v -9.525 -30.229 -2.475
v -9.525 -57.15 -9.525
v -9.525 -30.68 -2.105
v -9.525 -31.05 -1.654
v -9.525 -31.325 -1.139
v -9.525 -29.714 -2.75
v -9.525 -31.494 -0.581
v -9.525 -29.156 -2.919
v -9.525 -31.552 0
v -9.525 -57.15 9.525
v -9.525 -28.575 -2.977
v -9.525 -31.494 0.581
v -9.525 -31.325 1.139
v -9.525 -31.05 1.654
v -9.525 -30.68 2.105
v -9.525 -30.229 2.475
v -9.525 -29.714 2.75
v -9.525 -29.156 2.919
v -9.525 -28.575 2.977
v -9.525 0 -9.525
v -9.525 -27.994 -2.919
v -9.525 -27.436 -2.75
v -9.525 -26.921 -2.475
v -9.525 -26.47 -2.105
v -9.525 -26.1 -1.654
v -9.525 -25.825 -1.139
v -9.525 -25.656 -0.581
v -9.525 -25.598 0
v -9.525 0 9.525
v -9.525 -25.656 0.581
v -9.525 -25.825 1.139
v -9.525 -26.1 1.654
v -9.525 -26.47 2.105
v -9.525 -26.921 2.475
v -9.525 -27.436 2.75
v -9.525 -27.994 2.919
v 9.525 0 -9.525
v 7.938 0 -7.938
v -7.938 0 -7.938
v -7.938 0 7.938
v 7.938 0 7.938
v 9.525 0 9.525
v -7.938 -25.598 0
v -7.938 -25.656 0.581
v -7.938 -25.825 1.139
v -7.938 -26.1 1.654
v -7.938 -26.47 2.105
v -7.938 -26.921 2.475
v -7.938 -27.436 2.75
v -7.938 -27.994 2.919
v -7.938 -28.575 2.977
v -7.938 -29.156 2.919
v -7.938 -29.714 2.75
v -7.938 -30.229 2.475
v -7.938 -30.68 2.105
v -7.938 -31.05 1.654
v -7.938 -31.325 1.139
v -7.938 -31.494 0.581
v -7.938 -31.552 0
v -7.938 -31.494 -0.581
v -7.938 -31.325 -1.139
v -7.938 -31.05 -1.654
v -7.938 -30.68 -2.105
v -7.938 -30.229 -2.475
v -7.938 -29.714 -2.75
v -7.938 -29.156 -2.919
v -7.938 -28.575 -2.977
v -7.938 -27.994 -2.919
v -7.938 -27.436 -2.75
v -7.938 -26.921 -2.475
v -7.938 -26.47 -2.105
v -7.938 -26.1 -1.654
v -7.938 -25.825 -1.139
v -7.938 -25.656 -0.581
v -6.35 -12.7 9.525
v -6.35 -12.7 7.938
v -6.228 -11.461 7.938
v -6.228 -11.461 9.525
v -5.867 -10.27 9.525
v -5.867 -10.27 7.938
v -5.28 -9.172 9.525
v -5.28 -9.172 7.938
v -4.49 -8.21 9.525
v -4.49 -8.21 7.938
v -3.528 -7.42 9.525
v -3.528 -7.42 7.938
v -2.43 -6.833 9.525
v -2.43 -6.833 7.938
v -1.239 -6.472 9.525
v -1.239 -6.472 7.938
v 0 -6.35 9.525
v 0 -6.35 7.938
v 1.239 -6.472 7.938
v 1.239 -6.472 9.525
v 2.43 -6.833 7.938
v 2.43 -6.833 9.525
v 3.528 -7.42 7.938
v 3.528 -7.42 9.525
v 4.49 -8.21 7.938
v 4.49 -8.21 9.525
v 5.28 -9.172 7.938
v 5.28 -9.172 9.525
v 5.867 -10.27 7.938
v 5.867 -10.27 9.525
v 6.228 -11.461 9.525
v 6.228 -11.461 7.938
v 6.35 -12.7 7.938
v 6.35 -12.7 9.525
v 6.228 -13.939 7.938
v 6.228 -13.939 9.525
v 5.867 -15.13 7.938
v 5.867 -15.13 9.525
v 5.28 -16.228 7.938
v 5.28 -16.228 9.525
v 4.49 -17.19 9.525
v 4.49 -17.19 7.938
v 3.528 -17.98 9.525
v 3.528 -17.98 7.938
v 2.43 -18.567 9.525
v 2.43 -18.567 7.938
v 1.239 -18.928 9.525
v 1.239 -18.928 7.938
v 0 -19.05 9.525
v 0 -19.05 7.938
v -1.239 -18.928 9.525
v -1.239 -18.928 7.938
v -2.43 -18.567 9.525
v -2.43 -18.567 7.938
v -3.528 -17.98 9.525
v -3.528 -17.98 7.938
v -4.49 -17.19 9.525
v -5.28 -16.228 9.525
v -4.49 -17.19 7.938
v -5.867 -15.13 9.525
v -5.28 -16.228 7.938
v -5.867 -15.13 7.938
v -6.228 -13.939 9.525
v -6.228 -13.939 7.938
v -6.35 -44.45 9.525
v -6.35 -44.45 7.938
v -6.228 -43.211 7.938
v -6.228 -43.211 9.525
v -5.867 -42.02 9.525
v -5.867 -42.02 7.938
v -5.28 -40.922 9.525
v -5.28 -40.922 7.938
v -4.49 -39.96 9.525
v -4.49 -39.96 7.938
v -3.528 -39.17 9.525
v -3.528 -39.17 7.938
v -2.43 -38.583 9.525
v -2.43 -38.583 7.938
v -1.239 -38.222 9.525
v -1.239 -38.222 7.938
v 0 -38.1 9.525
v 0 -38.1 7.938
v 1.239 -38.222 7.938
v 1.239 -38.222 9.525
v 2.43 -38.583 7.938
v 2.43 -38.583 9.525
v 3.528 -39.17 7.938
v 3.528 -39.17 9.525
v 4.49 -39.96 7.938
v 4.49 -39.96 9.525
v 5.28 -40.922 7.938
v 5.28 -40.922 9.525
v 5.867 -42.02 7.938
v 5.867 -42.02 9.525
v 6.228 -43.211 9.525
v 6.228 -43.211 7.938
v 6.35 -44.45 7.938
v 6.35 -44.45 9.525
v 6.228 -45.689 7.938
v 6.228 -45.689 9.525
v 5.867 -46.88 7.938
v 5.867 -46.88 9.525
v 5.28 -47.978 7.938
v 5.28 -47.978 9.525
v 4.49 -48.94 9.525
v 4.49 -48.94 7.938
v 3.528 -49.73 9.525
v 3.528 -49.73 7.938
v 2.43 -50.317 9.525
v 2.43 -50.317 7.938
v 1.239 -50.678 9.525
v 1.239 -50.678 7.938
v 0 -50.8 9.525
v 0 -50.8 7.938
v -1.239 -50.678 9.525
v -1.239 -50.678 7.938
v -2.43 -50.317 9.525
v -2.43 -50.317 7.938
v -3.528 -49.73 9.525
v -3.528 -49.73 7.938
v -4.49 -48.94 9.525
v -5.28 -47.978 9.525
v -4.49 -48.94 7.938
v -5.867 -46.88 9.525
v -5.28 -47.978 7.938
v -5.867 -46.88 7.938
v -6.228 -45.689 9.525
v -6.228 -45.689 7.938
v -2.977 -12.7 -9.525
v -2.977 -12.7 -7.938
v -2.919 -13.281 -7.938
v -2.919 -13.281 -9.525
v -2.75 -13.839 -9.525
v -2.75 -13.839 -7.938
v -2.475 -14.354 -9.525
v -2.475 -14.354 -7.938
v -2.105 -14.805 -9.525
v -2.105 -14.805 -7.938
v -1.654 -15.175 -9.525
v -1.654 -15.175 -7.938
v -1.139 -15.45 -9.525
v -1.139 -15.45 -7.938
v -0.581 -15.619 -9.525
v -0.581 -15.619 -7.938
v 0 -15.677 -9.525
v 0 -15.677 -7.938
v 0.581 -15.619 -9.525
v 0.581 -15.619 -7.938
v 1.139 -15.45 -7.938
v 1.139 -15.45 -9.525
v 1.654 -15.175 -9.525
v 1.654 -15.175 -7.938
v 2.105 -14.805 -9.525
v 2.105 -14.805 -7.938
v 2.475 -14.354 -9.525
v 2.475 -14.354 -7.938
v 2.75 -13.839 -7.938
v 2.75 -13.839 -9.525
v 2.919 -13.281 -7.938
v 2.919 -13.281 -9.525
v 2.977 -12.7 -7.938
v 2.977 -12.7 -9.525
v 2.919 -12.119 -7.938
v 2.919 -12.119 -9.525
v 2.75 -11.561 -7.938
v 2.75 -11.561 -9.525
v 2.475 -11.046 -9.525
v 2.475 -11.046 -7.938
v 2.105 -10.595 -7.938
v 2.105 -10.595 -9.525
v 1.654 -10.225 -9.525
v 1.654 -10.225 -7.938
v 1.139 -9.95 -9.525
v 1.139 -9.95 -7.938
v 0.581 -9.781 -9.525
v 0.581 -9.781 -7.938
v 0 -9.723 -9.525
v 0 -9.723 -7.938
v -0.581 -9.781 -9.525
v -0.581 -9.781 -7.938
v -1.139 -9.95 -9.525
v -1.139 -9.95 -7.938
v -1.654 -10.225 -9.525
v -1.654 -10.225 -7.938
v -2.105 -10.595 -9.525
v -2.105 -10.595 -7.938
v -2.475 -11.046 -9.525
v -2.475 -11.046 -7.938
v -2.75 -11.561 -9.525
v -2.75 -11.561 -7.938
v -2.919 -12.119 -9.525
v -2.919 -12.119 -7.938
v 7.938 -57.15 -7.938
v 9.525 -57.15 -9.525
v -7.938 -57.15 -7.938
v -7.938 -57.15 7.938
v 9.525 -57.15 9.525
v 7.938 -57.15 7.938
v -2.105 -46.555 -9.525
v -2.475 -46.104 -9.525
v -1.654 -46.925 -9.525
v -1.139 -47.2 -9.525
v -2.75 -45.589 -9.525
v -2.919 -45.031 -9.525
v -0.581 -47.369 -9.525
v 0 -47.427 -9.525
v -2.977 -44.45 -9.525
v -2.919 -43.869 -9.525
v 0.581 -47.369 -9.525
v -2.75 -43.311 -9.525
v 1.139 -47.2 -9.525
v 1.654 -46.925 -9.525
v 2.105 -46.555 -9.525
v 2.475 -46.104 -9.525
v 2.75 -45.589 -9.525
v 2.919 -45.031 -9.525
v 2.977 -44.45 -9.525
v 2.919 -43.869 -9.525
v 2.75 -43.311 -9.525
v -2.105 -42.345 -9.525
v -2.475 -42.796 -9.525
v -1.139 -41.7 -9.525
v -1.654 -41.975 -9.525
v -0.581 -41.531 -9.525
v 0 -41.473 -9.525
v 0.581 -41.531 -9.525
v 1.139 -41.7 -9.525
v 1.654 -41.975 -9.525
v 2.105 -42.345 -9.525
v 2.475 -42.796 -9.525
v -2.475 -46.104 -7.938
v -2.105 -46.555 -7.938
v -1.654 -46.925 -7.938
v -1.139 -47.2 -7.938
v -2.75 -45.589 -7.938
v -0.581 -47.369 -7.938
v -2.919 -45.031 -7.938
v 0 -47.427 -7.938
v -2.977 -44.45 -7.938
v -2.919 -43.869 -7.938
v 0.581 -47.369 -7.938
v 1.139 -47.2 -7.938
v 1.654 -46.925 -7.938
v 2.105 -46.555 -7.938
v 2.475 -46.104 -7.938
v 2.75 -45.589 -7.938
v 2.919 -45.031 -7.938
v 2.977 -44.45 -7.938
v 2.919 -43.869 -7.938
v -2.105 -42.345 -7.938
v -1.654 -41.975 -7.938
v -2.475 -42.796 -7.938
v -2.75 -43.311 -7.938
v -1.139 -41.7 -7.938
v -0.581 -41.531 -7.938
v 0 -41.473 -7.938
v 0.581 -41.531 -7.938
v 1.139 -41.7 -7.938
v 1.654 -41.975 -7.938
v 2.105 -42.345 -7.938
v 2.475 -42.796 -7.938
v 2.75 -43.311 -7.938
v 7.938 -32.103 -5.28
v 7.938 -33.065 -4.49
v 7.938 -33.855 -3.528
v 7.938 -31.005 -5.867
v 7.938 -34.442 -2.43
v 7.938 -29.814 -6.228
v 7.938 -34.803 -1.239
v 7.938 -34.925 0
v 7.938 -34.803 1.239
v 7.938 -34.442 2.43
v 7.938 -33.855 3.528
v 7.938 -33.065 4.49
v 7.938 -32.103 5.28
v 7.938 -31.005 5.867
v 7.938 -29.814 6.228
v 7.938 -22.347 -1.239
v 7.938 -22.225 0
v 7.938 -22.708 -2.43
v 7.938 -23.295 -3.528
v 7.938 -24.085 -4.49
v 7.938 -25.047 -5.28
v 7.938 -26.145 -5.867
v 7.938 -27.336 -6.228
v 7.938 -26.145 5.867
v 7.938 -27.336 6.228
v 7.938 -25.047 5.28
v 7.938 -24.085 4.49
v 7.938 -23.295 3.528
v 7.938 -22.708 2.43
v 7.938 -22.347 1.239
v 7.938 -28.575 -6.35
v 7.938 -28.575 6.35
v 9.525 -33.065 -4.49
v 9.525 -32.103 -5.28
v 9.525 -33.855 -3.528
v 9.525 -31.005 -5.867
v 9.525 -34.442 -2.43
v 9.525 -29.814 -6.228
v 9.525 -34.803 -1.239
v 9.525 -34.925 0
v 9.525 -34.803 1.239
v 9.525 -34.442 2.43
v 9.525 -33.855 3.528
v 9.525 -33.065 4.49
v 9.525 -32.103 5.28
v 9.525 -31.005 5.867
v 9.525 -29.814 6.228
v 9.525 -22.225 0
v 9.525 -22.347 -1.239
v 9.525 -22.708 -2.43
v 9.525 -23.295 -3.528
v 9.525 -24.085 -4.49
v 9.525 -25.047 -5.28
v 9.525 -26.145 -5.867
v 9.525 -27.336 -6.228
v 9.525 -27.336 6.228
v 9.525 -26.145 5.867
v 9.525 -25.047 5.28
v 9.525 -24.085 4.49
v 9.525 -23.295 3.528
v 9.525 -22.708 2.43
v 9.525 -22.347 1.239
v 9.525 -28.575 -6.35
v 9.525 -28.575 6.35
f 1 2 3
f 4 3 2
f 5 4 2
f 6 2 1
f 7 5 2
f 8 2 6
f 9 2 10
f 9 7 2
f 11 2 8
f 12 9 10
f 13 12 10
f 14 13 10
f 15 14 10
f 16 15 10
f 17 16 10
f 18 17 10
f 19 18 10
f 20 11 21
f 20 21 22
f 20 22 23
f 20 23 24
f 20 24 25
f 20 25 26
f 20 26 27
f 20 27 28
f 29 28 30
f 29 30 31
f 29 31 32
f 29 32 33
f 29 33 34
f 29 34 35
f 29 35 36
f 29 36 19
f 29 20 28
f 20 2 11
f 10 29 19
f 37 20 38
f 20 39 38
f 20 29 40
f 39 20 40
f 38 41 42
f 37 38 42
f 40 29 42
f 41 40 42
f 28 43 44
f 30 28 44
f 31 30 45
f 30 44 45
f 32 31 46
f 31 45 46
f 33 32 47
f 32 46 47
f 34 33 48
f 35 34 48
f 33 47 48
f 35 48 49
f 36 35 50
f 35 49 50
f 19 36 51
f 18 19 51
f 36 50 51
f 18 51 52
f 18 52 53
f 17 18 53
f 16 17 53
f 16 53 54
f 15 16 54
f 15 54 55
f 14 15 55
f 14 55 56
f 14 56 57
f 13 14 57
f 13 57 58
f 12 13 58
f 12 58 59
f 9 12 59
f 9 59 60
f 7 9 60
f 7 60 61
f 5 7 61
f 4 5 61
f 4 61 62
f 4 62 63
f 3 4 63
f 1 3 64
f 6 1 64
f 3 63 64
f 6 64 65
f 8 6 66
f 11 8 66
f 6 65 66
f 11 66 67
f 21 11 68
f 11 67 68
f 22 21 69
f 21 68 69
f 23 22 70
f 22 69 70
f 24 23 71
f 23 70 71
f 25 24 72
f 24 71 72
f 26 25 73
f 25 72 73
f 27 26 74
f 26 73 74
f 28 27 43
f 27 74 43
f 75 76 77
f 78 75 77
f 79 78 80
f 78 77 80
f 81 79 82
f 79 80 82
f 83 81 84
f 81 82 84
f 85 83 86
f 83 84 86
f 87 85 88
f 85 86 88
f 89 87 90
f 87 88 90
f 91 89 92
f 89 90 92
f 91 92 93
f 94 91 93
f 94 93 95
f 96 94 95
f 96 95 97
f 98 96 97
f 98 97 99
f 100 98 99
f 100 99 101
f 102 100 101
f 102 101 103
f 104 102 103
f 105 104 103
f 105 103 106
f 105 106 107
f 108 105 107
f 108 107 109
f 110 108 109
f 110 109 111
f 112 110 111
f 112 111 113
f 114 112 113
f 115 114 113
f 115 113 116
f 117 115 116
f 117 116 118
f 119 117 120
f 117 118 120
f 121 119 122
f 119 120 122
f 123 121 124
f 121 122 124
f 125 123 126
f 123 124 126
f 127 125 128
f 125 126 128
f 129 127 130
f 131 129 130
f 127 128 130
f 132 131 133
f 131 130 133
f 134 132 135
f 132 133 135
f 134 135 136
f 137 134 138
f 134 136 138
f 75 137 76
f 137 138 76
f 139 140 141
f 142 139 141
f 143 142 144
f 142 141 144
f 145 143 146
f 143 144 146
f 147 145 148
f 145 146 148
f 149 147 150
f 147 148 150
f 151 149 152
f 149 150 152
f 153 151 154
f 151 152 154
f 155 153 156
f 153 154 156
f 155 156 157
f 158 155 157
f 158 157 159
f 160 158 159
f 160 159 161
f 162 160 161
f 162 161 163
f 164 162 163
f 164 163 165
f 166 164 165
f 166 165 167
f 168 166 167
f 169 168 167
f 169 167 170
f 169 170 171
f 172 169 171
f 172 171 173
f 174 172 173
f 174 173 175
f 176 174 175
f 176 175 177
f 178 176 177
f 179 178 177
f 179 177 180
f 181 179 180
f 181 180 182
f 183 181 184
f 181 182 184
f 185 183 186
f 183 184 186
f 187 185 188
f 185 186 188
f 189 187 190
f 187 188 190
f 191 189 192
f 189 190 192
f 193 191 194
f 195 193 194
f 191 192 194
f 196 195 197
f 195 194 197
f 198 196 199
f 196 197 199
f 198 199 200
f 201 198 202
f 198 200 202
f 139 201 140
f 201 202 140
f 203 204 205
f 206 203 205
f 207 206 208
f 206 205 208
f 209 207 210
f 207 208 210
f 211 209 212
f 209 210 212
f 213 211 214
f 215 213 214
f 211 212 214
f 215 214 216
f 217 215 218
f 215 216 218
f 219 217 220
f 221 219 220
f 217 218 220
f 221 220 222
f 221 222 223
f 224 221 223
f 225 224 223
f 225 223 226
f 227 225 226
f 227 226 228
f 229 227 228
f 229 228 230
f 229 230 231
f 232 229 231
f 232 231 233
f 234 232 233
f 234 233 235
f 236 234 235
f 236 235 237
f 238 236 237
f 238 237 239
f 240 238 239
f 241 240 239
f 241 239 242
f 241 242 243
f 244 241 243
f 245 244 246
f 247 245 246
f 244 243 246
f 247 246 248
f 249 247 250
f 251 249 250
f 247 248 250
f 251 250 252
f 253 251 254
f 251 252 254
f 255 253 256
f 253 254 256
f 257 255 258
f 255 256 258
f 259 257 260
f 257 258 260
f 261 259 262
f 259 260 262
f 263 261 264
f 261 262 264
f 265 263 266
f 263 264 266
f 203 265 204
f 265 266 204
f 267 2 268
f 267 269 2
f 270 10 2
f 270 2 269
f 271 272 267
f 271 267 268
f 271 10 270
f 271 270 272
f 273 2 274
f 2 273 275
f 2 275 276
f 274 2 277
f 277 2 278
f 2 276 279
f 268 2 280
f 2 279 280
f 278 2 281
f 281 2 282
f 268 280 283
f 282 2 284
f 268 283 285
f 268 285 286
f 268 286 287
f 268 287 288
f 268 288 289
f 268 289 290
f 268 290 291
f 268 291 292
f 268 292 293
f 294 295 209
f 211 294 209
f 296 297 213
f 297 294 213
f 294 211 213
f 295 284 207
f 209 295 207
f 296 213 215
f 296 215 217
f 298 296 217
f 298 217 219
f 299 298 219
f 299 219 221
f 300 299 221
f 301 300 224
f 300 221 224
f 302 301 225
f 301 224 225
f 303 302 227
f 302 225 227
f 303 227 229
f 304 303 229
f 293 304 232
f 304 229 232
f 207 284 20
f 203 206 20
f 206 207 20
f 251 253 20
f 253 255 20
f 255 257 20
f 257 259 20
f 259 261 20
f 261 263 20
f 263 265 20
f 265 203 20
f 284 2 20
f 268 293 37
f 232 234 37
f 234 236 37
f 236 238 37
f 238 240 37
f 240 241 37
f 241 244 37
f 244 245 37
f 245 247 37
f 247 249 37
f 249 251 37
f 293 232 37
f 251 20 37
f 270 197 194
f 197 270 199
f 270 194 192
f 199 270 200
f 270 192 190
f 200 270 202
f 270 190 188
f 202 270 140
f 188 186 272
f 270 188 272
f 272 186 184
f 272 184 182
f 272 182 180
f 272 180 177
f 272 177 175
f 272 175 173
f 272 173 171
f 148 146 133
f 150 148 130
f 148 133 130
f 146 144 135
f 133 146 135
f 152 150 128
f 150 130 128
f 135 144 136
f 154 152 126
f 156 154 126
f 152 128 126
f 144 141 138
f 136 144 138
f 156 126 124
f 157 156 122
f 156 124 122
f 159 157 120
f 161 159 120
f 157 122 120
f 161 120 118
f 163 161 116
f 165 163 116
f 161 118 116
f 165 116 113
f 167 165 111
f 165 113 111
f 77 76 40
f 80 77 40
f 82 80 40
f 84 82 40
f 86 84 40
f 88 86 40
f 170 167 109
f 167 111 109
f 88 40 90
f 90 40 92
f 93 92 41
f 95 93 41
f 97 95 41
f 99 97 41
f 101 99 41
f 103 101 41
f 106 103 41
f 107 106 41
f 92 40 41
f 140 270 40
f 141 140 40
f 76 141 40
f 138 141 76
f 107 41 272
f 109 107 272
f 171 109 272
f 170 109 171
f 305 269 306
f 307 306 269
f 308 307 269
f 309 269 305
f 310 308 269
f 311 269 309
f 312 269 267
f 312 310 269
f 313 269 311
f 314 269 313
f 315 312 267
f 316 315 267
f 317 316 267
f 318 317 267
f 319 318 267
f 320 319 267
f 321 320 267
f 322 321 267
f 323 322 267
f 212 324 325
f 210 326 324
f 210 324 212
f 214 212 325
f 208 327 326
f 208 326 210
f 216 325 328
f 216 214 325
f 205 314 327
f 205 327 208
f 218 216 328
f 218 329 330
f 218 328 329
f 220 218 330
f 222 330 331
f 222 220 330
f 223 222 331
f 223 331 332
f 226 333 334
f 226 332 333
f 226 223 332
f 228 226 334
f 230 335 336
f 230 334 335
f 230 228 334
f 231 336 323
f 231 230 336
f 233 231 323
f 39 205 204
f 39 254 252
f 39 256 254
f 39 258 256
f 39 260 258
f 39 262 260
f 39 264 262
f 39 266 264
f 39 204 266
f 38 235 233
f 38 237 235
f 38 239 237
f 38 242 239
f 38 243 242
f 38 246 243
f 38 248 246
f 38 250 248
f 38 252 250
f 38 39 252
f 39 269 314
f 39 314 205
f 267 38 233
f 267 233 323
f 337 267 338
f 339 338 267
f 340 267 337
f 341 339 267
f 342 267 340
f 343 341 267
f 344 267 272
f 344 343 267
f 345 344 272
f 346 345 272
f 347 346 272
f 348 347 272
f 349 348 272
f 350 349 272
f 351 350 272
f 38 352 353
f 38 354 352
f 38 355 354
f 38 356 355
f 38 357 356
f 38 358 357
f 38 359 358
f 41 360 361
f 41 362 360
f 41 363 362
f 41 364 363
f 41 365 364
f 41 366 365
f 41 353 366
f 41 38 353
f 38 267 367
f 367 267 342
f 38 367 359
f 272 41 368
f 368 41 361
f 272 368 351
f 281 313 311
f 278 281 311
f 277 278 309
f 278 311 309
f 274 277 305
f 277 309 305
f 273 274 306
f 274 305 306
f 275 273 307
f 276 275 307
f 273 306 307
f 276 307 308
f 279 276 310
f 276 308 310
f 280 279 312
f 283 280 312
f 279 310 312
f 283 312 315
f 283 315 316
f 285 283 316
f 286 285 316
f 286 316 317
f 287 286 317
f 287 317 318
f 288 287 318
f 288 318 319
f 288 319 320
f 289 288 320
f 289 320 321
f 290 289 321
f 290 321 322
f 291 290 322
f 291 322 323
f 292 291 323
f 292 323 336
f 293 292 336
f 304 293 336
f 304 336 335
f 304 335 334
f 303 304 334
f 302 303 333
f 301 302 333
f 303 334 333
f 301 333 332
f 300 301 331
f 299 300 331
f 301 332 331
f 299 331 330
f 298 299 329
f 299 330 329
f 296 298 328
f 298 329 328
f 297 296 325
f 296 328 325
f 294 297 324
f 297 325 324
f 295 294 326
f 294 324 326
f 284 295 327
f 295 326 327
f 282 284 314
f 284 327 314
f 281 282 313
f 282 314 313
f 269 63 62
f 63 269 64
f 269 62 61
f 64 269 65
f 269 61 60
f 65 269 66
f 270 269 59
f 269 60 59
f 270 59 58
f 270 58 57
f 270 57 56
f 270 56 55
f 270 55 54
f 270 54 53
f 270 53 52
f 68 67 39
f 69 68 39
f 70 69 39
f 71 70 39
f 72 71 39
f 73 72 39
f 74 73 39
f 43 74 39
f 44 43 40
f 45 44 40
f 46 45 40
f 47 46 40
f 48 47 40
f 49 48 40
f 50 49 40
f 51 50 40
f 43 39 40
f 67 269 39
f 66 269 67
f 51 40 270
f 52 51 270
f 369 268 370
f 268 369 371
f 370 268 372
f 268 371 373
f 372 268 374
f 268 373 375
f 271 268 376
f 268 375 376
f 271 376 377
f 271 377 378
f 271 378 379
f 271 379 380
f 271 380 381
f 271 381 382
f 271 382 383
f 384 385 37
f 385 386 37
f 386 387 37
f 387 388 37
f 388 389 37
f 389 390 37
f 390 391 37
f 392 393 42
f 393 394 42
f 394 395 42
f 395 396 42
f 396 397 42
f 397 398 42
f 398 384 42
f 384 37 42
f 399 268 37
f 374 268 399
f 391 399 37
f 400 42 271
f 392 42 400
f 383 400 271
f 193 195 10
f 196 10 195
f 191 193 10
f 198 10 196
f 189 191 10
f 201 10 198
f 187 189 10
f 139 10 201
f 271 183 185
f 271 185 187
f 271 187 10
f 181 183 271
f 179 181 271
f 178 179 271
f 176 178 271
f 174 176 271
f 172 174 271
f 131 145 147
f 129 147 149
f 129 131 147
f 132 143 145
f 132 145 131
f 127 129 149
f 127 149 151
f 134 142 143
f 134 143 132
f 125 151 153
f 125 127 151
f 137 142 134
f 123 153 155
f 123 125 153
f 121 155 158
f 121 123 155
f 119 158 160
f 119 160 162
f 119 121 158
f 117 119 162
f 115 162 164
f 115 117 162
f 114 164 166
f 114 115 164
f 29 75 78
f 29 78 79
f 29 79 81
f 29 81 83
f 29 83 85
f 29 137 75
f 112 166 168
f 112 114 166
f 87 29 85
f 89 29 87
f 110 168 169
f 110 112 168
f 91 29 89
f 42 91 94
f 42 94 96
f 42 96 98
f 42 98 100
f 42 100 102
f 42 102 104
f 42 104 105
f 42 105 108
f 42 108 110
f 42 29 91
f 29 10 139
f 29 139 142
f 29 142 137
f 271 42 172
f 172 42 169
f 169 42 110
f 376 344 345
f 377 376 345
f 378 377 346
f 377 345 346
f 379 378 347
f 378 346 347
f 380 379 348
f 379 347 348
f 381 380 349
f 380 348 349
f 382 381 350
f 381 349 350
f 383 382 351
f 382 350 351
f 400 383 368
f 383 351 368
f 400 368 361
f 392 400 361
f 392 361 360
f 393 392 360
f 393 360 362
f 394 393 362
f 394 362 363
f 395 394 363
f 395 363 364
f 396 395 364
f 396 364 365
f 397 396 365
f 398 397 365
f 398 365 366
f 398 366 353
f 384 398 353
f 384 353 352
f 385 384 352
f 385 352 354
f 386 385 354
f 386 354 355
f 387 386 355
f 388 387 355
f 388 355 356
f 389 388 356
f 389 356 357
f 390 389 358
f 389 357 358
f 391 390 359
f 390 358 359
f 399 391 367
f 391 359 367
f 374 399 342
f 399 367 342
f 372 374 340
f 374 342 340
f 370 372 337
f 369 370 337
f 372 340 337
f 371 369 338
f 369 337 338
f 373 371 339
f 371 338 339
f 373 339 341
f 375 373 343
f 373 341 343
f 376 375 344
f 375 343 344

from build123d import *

# Parameters (mm, degrees)
F0_W     = 19.05
F0_H     = 19.05
F0_W_2   = 15.875
F0_H_2   = 15.875
F1_DEPTH = 57.15
F3_D     = 5.953125
F3_DEPTH = 6.35
F5_D     = 12.7
F5_DEPTH = 6.35
F7_D     = 12.7
F7_DEPTH = 6.35
F9_D     = 5.953125
F9_DEPTH = 6.35


with BuildPart() as f1:
    # F0 (on Front) → F1 (new body)
    with BuildSketch(Plane.XZ):
        Rectangle(F0_W, F0_H)
        Rectangle(F0_W_2, F0_H_2, mode=Mode.SUBTRACT)
    extrude(amount=F1_DEPTH)

    # F3
    with Locations(Plane(origin=(0, 0, -9.525), x_dir=(1, 0, 0), z_dir=(0, 0, -1))):
        with Locations((0, 44.45), (0, 12.7)):
            Hole(F3_D / 2, depth=F3_DEPTH)

    # F5
    with Locations(Plane.XY.offset(9.525)):
        with Locations((0, -12.7), (0, -44.45)):
            Hole(F5_D / 2, depth=F5_DEPTH)

    # F7
    with Locations(Plane.YZ.offset(9.525)):
        with Locations((-28.575, 0)):
            Hole(F7_D / 2, depth=F7_DEPTH)

    # F9
    with Locations(Plane(origin=(-9.525, 0, 0), x_dir=(0, -1, 0), z_dir=(-1, 0, 0))):
        with Locations((28.575, 0)):
            Hole(F9_D / 2, depth=F9_DEPTH)


solid = f1.part
